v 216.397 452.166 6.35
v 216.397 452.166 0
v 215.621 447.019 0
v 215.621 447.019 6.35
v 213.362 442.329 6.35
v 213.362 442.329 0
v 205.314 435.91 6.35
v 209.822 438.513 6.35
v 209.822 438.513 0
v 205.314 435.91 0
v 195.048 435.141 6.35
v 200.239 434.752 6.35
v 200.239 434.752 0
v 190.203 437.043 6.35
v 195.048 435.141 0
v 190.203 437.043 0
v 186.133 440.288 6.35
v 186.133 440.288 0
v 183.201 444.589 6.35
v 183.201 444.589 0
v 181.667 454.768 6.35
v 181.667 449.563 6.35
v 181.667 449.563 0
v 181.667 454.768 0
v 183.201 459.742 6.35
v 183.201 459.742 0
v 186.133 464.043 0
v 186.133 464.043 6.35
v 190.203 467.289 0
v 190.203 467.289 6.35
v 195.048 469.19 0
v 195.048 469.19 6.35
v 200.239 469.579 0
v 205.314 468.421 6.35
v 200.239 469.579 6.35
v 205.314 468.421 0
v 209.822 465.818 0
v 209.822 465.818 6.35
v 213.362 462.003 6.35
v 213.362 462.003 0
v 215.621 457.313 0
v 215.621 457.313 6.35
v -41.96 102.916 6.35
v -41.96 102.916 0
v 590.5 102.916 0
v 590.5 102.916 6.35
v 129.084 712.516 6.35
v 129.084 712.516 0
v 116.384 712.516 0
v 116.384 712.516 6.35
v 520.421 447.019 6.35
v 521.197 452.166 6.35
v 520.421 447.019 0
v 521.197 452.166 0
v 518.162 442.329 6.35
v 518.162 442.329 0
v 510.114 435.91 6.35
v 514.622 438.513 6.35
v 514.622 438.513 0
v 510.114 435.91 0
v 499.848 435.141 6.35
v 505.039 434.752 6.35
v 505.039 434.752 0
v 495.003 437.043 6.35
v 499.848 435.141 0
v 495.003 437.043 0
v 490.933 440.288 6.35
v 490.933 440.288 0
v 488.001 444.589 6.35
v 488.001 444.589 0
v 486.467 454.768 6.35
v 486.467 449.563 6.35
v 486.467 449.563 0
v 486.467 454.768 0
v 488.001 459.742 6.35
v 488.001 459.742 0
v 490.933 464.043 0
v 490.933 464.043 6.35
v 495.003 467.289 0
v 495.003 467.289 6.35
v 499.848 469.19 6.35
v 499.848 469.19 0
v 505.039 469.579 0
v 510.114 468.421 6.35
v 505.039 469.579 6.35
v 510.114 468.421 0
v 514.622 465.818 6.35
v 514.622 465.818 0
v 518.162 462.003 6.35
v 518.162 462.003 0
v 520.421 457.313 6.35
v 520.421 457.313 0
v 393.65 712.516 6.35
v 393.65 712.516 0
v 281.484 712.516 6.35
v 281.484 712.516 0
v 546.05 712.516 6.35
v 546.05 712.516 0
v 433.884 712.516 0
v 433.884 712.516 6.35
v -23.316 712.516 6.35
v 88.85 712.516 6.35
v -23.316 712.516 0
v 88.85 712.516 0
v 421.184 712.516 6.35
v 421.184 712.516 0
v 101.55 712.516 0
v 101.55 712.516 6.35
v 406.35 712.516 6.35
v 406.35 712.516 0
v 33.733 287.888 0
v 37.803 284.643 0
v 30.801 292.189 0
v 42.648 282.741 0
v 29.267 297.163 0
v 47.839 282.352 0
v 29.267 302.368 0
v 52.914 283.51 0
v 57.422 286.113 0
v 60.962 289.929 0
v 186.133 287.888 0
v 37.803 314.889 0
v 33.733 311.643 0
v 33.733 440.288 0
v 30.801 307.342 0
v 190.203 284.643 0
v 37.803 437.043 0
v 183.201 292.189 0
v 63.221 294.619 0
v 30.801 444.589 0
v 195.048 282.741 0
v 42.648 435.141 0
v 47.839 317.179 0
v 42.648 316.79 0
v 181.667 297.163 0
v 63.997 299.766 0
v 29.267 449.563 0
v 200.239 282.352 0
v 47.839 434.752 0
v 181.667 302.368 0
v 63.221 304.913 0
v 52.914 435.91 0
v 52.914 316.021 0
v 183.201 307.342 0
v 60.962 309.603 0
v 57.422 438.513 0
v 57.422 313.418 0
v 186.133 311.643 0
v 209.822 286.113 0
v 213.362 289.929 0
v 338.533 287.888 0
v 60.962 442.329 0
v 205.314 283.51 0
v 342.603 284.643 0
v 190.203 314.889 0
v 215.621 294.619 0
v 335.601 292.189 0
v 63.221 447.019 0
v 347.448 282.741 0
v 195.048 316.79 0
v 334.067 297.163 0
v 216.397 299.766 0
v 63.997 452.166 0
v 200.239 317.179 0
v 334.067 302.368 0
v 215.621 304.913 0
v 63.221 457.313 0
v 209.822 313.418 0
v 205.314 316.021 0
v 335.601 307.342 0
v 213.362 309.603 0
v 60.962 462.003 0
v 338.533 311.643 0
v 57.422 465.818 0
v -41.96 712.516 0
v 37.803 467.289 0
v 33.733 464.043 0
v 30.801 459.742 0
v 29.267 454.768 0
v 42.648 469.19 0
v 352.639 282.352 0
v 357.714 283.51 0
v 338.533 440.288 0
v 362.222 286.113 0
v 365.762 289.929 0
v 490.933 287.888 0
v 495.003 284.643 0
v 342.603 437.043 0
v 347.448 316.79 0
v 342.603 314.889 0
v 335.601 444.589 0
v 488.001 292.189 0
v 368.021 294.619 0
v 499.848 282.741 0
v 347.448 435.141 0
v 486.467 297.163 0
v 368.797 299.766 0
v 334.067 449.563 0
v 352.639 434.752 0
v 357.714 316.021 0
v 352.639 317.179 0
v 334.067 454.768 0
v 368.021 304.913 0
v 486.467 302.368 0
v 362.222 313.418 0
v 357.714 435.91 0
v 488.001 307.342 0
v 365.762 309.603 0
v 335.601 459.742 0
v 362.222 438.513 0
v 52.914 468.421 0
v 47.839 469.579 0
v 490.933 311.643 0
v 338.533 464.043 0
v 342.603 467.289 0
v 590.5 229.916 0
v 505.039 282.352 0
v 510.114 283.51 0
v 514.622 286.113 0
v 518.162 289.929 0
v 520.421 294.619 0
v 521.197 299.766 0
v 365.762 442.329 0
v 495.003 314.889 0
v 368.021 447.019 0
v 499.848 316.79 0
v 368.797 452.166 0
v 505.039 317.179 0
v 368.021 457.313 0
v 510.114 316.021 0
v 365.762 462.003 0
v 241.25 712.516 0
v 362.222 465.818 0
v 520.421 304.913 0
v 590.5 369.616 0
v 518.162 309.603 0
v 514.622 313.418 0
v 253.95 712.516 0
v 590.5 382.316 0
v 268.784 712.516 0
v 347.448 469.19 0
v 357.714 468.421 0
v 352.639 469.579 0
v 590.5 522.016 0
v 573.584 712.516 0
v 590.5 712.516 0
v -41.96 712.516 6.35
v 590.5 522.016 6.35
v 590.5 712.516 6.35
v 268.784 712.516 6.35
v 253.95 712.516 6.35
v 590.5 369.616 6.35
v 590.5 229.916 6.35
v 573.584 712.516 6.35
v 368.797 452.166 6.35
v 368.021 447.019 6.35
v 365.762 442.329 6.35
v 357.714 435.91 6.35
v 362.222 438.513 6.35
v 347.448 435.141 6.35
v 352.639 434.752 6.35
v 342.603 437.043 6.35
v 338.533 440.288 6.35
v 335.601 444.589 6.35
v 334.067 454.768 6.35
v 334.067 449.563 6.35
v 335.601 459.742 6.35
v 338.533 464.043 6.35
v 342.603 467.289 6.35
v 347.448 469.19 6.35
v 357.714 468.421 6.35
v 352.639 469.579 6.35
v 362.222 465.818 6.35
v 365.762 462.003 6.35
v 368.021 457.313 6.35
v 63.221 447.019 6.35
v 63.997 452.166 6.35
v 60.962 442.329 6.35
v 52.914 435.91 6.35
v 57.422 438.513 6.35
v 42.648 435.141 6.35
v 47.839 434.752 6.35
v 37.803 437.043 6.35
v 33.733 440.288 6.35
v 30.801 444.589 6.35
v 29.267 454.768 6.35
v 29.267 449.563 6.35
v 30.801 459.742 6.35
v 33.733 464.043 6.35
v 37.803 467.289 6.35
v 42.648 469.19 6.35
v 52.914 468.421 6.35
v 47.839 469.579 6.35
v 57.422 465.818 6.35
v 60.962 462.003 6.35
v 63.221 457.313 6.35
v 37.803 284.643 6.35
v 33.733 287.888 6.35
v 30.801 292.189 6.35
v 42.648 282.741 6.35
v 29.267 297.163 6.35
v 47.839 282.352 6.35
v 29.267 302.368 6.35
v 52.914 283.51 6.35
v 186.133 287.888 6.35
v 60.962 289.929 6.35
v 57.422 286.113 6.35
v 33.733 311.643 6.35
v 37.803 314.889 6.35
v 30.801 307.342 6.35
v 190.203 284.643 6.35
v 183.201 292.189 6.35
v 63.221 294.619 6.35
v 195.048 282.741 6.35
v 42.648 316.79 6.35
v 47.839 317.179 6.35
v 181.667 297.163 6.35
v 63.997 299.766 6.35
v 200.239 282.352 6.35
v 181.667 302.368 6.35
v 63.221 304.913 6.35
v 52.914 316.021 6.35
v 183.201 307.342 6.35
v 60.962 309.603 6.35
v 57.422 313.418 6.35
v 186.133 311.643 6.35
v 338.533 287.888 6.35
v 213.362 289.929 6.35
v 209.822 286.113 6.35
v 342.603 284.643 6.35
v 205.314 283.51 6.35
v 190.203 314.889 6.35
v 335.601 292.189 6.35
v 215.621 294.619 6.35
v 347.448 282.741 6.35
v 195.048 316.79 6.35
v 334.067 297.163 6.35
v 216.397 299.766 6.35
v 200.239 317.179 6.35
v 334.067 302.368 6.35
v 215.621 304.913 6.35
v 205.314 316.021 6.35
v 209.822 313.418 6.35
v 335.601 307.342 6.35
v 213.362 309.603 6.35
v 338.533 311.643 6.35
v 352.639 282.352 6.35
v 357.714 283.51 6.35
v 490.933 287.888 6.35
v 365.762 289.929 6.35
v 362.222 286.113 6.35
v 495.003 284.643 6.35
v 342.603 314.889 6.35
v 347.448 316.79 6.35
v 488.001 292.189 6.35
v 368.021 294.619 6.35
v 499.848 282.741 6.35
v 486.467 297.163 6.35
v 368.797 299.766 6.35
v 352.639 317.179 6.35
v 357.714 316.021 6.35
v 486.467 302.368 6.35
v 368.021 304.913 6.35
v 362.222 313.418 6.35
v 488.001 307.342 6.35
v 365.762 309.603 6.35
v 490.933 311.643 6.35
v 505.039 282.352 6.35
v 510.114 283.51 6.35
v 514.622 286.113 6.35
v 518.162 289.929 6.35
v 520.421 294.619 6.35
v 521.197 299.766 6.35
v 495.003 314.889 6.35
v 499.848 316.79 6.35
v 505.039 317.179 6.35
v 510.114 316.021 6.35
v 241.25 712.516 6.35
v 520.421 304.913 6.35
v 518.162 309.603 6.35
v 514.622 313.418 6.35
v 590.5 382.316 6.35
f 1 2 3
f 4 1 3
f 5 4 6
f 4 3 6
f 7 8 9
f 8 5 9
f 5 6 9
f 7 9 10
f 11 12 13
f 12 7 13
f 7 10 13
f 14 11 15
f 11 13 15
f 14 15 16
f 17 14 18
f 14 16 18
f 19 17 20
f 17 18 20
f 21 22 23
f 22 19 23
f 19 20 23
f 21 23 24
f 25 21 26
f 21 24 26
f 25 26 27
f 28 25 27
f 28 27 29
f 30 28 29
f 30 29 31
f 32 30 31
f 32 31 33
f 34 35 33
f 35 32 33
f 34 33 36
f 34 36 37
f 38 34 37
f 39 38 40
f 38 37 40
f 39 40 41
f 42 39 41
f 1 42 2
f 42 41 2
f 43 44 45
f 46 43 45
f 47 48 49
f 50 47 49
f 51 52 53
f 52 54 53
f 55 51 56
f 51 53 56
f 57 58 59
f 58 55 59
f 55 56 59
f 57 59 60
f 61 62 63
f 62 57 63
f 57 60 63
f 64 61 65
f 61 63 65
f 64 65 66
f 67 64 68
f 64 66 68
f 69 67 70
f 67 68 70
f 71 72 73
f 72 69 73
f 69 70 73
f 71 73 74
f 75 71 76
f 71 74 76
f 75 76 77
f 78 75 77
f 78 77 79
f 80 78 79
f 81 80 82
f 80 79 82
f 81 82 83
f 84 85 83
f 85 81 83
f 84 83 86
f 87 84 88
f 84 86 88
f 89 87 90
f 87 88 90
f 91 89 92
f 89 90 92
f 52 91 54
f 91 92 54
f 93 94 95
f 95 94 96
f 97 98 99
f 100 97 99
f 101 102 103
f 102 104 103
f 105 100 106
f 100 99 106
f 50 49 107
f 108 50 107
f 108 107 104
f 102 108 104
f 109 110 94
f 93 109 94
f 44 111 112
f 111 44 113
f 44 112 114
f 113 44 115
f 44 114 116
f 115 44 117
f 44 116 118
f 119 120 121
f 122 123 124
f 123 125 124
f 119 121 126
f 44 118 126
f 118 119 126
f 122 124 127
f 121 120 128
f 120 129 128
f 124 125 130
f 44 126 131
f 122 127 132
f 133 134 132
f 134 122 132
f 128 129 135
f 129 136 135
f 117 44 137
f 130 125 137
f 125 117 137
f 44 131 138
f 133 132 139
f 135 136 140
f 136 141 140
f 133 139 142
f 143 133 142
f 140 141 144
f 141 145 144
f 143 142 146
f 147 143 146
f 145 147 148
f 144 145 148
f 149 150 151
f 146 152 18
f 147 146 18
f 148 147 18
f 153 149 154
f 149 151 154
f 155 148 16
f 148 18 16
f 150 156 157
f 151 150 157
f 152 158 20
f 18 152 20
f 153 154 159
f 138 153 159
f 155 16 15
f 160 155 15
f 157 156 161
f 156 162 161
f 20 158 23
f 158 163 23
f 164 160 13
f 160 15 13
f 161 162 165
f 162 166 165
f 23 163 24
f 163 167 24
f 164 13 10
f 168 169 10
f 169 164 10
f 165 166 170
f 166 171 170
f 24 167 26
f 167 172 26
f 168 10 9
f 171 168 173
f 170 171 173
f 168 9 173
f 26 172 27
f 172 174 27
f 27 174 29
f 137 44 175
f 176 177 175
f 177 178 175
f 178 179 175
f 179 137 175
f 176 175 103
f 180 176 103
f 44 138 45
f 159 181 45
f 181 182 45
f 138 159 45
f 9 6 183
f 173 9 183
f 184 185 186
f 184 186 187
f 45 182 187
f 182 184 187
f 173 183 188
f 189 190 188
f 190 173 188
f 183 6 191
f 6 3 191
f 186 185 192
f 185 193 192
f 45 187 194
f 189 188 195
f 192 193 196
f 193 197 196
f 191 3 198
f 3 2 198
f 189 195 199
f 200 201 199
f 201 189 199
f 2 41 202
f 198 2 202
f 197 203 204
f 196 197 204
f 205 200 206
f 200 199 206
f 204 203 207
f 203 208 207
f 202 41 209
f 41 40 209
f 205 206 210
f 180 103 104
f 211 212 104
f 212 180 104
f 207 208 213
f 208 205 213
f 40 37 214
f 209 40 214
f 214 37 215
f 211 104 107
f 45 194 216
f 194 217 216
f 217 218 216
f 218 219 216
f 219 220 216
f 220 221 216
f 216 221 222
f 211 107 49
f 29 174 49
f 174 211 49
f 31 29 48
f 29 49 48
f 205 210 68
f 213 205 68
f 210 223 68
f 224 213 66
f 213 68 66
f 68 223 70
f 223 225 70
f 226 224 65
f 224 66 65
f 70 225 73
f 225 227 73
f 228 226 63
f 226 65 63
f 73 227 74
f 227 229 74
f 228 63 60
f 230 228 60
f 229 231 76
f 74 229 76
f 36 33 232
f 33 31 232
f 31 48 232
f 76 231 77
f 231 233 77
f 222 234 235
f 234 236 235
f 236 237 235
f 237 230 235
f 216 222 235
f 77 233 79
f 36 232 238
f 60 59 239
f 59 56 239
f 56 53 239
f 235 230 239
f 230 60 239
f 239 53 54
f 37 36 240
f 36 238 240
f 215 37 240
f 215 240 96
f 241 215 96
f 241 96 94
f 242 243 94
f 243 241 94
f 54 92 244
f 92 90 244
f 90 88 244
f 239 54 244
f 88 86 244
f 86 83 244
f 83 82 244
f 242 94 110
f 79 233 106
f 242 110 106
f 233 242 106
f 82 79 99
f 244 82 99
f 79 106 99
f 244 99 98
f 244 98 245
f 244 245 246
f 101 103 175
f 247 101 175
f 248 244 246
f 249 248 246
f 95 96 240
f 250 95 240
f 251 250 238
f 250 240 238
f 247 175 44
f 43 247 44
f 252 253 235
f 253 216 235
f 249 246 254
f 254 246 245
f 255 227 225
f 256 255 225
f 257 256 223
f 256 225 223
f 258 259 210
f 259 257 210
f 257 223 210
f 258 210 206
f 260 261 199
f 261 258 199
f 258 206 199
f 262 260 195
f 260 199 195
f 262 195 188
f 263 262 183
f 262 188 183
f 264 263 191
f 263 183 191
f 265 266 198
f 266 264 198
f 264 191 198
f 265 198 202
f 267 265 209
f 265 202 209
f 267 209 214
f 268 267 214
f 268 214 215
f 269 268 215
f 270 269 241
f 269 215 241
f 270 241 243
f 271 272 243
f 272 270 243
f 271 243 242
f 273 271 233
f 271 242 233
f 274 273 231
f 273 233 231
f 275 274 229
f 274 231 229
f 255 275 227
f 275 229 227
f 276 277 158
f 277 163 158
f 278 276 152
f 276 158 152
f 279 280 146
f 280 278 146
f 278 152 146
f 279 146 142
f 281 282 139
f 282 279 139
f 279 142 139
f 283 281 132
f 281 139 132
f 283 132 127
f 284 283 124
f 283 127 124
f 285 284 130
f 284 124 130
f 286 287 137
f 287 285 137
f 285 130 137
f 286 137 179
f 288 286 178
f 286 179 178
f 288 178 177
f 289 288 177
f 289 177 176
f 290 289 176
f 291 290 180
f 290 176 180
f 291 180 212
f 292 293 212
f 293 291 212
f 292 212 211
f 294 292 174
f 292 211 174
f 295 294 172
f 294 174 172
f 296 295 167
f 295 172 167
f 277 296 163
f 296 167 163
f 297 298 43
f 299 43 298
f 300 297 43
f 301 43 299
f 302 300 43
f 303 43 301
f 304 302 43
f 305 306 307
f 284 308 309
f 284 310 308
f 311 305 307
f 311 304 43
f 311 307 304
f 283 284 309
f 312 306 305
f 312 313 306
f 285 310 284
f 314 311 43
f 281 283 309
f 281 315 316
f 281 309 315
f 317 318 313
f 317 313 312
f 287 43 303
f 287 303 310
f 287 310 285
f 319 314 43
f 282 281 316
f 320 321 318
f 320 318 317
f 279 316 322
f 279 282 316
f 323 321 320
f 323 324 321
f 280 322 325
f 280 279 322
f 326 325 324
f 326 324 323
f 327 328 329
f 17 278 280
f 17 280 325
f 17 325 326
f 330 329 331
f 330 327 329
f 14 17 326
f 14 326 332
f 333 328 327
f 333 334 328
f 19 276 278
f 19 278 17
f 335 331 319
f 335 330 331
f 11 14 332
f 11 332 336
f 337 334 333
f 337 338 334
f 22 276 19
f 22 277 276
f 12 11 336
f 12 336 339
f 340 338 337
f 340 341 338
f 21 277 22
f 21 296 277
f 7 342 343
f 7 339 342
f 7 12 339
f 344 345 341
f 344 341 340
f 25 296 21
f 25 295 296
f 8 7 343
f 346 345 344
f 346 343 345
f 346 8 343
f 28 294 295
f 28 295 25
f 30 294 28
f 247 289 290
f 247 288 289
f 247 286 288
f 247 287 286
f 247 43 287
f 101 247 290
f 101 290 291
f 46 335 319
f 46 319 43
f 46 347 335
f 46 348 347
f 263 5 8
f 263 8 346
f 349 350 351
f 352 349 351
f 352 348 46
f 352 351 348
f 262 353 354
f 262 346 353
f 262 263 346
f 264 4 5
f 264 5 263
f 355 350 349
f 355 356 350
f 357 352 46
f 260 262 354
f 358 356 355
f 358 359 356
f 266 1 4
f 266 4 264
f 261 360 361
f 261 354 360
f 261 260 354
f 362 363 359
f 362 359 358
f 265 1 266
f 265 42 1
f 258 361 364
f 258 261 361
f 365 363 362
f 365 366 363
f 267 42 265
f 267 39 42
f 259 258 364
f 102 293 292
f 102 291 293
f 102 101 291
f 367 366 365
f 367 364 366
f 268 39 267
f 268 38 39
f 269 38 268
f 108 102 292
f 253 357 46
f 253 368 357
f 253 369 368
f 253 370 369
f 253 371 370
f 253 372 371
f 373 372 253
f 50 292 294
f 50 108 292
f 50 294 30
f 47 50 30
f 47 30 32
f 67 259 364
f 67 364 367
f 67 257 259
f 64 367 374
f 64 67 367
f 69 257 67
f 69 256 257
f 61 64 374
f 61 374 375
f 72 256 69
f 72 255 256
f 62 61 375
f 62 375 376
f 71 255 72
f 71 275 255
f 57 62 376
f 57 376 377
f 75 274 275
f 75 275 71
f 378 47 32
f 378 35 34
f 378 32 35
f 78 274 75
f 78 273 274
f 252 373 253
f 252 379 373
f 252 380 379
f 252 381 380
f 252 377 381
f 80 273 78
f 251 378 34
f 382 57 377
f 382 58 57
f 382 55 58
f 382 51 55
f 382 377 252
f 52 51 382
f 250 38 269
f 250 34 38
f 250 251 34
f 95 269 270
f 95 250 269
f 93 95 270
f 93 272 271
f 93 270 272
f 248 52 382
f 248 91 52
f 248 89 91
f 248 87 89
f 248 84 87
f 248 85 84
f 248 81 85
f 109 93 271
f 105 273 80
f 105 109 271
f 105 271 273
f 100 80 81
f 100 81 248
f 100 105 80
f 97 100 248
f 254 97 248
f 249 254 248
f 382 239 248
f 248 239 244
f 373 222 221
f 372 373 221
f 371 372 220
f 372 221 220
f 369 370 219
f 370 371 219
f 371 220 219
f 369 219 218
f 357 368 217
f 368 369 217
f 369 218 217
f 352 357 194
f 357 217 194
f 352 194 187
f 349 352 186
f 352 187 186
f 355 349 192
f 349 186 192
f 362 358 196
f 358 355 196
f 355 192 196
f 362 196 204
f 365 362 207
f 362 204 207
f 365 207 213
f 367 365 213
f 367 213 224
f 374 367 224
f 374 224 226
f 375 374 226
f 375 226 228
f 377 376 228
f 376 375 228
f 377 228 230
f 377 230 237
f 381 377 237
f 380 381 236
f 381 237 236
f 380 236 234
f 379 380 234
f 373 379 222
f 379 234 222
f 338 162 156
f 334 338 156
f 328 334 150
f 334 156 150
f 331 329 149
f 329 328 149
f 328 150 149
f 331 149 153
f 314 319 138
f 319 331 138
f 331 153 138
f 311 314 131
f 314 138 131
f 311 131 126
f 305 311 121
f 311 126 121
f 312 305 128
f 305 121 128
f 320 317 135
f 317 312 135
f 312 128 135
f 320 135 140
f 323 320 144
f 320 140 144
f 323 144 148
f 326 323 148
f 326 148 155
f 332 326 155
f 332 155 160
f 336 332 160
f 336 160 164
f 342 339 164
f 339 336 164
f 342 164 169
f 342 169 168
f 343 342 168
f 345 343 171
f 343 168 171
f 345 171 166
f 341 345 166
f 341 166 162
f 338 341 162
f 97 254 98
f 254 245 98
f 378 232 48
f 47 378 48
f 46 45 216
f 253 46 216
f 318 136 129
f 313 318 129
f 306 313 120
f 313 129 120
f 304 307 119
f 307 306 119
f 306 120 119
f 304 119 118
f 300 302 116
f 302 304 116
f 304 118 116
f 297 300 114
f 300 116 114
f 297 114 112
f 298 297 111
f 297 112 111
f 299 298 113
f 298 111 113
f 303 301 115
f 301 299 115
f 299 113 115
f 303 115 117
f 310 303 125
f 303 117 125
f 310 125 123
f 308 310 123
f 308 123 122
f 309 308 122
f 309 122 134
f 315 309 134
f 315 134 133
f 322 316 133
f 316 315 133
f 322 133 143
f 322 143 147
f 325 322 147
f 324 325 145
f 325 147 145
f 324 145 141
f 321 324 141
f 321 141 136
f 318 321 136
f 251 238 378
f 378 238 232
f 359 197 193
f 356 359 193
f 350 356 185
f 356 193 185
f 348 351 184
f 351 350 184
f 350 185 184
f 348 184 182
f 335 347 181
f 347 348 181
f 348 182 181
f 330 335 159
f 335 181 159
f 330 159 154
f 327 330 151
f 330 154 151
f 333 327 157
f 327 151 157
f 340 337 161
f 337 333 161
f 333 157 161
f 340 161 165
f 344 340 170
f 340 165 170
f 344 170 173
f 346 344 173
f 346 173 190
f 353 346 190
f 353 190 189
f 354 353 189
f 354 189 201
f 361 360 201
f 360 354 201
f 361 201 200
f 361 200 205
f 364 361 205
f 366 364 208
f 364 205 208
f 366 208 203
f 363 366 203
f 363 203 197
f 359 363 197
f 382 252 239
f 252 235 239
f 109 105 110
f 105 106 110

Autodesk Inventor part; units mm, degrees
ref_plane "YZ Plane" through (0, 0, 0) normal (1, 0, 0) x (0, 1, 0)
ref_plane "XZ Plane" through (0, 0, 0) normal (0, 1, 0) x (-1, 0, 0)
ref_plane "XY Plane" through (0, 0, 0) normal (0, 0, 1) x (1, 0, 0)
sketch "Sketch1" plane through (0, 0, 0) normal (0, 0, 1) x (1, 0, 0)
  line L0 (-41.9595, 102.9157) -> (590.5005, 102.9157)
  line L1 (590.5005, 102.9157) -> (590.5005, 712.5157)
  line L2 (590.5005, 712.5157) -> (-41.9595, 712.5157)
  line L3 (-41.9595, 712.5157) -> (-41.9595, 102.9157)
  line L4 (-41.9595, 712.5157) -> (-23.3159, 712.5157)
  line L5 (590.5005, 712.5157) -> (546.0505, 712.5157)
  line L6 (546.0505, 712.5157) -> (406.3505, 712.5157)
  line L7 (406.3505, 712.5157) -> (393.6505, 712.5157)
  line L8 (393.6505, 712.5157) -> (253.9505, 712.5157)
  line L9 (253.9505, 712.5157) -> (241.2505, 712.5157)
  line L10 (241.2505, 712.5157) -> (101.5505, 712.5157)
  line L11 (101.5505, 712.5157) -> (88.8505, 712.5157)
  line L12 (88.8505, 712.5157) -> (-23.3159, 712.5157)
  line L13 (590.5005, 102.9157) -> (590.5005, 229.9157)
  line L14 (590.5005, 229.9157) -> (590.5005, 369.6157)
  line L15 (590.5005, 369.6157) -> (590.5005, 382.3157)
  line L16 (590.5005, 382.3157) -> (590.5005, 522.0157)
  circle A0 centre (46.5341, 452.1657) radius 17.4625
  circle A1 centre (198.9341, 452.1657) radius 17.4625
  circle A2 centre (351.3341, 452.1657) radius 17.4625
  circle A3 centre (503.7341, 452.1657) radius 17.4625
  circle A4 centre (46.5341, 299.7657) radius 17.4625
  circle A5 centre (198.9341, 299.7657) radius 17.4625
  circle A6 centre (351.3341, 299.7657) radius 17.4625
  circle A7 centre (503.7341, 299.7657) radius 17.4625
  line L17 (-23.3159, 712.5157) -> (116.3841, 712.5157)
  line L18 (116.3841, 712.5157) -> (129.0841, 712.5157)
  line L19 (129.0841, 712.5157) -> (268.7841, 712.5157)
  line L20 (268.7841, 712.5157) -> (281.4841, 712.5157)
  line L21 (281.4841, 712.5157) -> (421.1841, 712.5157)
  line L22 (421.1841, 712.5157) -> (433.8841, 712.5157)
  line L23 (433.8841, 712.5157) -> (573.5841, 712.5157)
  dimension "d0" = 632.46
  dimension "d1" = 609.6
  dimension "d2" = 18.6436
  dimension "d24" = 127
  dimension "d25" = 139.7
  dimension "d26" = 12.7
  dimension "d27" = 139.7
  dimension "d28" = 34.925
  dimension "d29" = 34.925
  dimension "d30" = 34.925
  dimension "d31" = 34.925
  dimension "d32" = 34.925
  dimension "d33" = 34.925
  dimension "d34" = 34.925
  dimension "d35" = 34.925
  dimension "d38" = 139.7
  dimension "d39" = 12.7
  dimension "d40" = 139.7
  dimension "d41" = 12.7
  dimension "d42" = 139.7
  dimension "d43" = 12.7
  dimension "d44" = 139.7
extrude "Extrusion2" add sketch "Sketch1" along normal blind 6.35
equation "\"BendRadius\" = Thickness"
equation "\"BendReliefWidth\" = Thickness"
equation "\"BendReliefDepth\" = 0.5 * Thickness"
equation "\"CornerReliefSize\" = 4 * Thickness"
equation "\"MinimumRemnant\" = 2 * Thickness"
equation "\"TransitionRadius\" = BendRadius"
equation "\"JacobiRadiusSize\" = BendRadius"
equation "\"GapSize\" = Thickness"
equation "\"Thickness\" = 3.048"
properties part number "vessel support bottom"
